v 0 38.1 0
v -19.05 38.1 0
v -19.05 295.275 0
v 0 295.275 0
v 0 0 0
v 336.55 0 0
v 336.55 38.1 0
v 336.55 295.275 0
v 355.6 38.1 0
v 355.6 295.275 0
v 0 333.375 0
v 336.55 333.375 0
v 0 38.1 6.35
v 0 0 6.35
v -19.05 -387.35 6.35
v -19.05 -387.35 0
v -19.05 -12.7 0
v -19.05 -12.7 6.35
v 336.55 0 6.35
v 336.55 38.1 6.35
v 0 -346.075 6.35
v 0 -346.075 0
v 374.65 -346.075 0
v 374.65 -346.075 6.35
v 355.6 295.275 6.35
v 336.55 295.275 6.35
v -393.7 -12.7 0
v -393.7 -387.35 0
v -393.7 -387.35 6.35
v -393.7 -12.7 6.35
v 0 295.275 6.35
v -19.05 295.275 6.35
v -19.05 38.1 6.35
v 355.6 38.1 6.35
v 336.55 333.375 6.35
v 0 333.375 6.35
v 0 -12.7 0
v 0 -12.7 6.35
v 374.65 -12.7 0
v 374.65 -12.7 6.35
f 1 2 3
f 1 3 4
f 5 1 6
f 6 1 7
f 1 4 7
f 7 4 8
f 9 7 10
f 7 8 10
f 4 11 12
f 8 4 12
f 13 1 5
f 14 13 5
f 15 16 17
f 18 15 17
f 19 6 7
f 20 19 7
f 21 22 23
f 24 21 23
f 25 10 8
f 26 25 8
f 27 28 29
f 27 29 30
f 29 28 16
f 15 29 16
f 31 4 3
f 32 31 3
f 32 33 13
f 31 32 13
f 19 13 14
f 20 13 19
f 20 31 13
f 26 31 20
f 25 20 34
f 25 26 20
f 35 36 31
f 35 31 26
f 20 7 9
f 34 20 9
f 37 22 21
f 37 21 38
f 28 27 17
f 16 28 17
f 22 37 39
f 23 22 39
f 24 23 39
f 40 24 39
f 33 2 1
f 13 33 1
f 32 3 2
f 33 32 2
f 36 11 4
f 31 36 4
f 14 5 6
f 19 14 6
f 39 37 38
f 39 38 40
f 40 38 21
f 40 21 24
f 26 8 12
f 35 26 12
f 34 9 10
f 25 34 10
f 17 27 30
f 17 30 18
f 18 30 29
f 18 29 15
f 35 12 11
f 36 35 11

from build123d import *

# Parameters (mm, degrees)
F1_DEPTH = 6.35
F2_W     = 374.65
F2_H     = 333.375
F3_DEPTH = 6.35
F4_W     = 374.65
F4_H     = 374.65
F5_DEPTH = 6.35


with BuildPart() as f1:
    # F0 (on Top) → F1 (new body)
    with BuildSketch(Plane.XY):
        Polygon((0, 38.1), (0, 0), (336.55, 0), (336.55, 38.1), (355.6, 38.1), (355.6, 295.275), (336.55, 295.275), (336.55, 333.375), (0, 333.375), (0, 295.275), (-19.05, 295.275), (-19.05, 38.1), align=None)
    extrude(amount=F1_DEPTH)


with BuildPart() as f3:
    # F2 (on Top) → F3 (new body)
    with BuildSketch(Plane.XY):
        with Locations((187.325, -179.3875)):
            Rectangle(F2_W, F2_H)
    extrude(amount=F3_DEPTH)


with BuildPart() as f5:
    # F4 (on Top) → F5 (new body)
    with BuildSketch(Plane.XY):
        with Locations((-206.375, -200.025)):
            Rectangle(F4_W, F4_H)
    extrude(amount=F5_DEPTH)


solid = Compound([f1.part, f3.part, f5.part])
